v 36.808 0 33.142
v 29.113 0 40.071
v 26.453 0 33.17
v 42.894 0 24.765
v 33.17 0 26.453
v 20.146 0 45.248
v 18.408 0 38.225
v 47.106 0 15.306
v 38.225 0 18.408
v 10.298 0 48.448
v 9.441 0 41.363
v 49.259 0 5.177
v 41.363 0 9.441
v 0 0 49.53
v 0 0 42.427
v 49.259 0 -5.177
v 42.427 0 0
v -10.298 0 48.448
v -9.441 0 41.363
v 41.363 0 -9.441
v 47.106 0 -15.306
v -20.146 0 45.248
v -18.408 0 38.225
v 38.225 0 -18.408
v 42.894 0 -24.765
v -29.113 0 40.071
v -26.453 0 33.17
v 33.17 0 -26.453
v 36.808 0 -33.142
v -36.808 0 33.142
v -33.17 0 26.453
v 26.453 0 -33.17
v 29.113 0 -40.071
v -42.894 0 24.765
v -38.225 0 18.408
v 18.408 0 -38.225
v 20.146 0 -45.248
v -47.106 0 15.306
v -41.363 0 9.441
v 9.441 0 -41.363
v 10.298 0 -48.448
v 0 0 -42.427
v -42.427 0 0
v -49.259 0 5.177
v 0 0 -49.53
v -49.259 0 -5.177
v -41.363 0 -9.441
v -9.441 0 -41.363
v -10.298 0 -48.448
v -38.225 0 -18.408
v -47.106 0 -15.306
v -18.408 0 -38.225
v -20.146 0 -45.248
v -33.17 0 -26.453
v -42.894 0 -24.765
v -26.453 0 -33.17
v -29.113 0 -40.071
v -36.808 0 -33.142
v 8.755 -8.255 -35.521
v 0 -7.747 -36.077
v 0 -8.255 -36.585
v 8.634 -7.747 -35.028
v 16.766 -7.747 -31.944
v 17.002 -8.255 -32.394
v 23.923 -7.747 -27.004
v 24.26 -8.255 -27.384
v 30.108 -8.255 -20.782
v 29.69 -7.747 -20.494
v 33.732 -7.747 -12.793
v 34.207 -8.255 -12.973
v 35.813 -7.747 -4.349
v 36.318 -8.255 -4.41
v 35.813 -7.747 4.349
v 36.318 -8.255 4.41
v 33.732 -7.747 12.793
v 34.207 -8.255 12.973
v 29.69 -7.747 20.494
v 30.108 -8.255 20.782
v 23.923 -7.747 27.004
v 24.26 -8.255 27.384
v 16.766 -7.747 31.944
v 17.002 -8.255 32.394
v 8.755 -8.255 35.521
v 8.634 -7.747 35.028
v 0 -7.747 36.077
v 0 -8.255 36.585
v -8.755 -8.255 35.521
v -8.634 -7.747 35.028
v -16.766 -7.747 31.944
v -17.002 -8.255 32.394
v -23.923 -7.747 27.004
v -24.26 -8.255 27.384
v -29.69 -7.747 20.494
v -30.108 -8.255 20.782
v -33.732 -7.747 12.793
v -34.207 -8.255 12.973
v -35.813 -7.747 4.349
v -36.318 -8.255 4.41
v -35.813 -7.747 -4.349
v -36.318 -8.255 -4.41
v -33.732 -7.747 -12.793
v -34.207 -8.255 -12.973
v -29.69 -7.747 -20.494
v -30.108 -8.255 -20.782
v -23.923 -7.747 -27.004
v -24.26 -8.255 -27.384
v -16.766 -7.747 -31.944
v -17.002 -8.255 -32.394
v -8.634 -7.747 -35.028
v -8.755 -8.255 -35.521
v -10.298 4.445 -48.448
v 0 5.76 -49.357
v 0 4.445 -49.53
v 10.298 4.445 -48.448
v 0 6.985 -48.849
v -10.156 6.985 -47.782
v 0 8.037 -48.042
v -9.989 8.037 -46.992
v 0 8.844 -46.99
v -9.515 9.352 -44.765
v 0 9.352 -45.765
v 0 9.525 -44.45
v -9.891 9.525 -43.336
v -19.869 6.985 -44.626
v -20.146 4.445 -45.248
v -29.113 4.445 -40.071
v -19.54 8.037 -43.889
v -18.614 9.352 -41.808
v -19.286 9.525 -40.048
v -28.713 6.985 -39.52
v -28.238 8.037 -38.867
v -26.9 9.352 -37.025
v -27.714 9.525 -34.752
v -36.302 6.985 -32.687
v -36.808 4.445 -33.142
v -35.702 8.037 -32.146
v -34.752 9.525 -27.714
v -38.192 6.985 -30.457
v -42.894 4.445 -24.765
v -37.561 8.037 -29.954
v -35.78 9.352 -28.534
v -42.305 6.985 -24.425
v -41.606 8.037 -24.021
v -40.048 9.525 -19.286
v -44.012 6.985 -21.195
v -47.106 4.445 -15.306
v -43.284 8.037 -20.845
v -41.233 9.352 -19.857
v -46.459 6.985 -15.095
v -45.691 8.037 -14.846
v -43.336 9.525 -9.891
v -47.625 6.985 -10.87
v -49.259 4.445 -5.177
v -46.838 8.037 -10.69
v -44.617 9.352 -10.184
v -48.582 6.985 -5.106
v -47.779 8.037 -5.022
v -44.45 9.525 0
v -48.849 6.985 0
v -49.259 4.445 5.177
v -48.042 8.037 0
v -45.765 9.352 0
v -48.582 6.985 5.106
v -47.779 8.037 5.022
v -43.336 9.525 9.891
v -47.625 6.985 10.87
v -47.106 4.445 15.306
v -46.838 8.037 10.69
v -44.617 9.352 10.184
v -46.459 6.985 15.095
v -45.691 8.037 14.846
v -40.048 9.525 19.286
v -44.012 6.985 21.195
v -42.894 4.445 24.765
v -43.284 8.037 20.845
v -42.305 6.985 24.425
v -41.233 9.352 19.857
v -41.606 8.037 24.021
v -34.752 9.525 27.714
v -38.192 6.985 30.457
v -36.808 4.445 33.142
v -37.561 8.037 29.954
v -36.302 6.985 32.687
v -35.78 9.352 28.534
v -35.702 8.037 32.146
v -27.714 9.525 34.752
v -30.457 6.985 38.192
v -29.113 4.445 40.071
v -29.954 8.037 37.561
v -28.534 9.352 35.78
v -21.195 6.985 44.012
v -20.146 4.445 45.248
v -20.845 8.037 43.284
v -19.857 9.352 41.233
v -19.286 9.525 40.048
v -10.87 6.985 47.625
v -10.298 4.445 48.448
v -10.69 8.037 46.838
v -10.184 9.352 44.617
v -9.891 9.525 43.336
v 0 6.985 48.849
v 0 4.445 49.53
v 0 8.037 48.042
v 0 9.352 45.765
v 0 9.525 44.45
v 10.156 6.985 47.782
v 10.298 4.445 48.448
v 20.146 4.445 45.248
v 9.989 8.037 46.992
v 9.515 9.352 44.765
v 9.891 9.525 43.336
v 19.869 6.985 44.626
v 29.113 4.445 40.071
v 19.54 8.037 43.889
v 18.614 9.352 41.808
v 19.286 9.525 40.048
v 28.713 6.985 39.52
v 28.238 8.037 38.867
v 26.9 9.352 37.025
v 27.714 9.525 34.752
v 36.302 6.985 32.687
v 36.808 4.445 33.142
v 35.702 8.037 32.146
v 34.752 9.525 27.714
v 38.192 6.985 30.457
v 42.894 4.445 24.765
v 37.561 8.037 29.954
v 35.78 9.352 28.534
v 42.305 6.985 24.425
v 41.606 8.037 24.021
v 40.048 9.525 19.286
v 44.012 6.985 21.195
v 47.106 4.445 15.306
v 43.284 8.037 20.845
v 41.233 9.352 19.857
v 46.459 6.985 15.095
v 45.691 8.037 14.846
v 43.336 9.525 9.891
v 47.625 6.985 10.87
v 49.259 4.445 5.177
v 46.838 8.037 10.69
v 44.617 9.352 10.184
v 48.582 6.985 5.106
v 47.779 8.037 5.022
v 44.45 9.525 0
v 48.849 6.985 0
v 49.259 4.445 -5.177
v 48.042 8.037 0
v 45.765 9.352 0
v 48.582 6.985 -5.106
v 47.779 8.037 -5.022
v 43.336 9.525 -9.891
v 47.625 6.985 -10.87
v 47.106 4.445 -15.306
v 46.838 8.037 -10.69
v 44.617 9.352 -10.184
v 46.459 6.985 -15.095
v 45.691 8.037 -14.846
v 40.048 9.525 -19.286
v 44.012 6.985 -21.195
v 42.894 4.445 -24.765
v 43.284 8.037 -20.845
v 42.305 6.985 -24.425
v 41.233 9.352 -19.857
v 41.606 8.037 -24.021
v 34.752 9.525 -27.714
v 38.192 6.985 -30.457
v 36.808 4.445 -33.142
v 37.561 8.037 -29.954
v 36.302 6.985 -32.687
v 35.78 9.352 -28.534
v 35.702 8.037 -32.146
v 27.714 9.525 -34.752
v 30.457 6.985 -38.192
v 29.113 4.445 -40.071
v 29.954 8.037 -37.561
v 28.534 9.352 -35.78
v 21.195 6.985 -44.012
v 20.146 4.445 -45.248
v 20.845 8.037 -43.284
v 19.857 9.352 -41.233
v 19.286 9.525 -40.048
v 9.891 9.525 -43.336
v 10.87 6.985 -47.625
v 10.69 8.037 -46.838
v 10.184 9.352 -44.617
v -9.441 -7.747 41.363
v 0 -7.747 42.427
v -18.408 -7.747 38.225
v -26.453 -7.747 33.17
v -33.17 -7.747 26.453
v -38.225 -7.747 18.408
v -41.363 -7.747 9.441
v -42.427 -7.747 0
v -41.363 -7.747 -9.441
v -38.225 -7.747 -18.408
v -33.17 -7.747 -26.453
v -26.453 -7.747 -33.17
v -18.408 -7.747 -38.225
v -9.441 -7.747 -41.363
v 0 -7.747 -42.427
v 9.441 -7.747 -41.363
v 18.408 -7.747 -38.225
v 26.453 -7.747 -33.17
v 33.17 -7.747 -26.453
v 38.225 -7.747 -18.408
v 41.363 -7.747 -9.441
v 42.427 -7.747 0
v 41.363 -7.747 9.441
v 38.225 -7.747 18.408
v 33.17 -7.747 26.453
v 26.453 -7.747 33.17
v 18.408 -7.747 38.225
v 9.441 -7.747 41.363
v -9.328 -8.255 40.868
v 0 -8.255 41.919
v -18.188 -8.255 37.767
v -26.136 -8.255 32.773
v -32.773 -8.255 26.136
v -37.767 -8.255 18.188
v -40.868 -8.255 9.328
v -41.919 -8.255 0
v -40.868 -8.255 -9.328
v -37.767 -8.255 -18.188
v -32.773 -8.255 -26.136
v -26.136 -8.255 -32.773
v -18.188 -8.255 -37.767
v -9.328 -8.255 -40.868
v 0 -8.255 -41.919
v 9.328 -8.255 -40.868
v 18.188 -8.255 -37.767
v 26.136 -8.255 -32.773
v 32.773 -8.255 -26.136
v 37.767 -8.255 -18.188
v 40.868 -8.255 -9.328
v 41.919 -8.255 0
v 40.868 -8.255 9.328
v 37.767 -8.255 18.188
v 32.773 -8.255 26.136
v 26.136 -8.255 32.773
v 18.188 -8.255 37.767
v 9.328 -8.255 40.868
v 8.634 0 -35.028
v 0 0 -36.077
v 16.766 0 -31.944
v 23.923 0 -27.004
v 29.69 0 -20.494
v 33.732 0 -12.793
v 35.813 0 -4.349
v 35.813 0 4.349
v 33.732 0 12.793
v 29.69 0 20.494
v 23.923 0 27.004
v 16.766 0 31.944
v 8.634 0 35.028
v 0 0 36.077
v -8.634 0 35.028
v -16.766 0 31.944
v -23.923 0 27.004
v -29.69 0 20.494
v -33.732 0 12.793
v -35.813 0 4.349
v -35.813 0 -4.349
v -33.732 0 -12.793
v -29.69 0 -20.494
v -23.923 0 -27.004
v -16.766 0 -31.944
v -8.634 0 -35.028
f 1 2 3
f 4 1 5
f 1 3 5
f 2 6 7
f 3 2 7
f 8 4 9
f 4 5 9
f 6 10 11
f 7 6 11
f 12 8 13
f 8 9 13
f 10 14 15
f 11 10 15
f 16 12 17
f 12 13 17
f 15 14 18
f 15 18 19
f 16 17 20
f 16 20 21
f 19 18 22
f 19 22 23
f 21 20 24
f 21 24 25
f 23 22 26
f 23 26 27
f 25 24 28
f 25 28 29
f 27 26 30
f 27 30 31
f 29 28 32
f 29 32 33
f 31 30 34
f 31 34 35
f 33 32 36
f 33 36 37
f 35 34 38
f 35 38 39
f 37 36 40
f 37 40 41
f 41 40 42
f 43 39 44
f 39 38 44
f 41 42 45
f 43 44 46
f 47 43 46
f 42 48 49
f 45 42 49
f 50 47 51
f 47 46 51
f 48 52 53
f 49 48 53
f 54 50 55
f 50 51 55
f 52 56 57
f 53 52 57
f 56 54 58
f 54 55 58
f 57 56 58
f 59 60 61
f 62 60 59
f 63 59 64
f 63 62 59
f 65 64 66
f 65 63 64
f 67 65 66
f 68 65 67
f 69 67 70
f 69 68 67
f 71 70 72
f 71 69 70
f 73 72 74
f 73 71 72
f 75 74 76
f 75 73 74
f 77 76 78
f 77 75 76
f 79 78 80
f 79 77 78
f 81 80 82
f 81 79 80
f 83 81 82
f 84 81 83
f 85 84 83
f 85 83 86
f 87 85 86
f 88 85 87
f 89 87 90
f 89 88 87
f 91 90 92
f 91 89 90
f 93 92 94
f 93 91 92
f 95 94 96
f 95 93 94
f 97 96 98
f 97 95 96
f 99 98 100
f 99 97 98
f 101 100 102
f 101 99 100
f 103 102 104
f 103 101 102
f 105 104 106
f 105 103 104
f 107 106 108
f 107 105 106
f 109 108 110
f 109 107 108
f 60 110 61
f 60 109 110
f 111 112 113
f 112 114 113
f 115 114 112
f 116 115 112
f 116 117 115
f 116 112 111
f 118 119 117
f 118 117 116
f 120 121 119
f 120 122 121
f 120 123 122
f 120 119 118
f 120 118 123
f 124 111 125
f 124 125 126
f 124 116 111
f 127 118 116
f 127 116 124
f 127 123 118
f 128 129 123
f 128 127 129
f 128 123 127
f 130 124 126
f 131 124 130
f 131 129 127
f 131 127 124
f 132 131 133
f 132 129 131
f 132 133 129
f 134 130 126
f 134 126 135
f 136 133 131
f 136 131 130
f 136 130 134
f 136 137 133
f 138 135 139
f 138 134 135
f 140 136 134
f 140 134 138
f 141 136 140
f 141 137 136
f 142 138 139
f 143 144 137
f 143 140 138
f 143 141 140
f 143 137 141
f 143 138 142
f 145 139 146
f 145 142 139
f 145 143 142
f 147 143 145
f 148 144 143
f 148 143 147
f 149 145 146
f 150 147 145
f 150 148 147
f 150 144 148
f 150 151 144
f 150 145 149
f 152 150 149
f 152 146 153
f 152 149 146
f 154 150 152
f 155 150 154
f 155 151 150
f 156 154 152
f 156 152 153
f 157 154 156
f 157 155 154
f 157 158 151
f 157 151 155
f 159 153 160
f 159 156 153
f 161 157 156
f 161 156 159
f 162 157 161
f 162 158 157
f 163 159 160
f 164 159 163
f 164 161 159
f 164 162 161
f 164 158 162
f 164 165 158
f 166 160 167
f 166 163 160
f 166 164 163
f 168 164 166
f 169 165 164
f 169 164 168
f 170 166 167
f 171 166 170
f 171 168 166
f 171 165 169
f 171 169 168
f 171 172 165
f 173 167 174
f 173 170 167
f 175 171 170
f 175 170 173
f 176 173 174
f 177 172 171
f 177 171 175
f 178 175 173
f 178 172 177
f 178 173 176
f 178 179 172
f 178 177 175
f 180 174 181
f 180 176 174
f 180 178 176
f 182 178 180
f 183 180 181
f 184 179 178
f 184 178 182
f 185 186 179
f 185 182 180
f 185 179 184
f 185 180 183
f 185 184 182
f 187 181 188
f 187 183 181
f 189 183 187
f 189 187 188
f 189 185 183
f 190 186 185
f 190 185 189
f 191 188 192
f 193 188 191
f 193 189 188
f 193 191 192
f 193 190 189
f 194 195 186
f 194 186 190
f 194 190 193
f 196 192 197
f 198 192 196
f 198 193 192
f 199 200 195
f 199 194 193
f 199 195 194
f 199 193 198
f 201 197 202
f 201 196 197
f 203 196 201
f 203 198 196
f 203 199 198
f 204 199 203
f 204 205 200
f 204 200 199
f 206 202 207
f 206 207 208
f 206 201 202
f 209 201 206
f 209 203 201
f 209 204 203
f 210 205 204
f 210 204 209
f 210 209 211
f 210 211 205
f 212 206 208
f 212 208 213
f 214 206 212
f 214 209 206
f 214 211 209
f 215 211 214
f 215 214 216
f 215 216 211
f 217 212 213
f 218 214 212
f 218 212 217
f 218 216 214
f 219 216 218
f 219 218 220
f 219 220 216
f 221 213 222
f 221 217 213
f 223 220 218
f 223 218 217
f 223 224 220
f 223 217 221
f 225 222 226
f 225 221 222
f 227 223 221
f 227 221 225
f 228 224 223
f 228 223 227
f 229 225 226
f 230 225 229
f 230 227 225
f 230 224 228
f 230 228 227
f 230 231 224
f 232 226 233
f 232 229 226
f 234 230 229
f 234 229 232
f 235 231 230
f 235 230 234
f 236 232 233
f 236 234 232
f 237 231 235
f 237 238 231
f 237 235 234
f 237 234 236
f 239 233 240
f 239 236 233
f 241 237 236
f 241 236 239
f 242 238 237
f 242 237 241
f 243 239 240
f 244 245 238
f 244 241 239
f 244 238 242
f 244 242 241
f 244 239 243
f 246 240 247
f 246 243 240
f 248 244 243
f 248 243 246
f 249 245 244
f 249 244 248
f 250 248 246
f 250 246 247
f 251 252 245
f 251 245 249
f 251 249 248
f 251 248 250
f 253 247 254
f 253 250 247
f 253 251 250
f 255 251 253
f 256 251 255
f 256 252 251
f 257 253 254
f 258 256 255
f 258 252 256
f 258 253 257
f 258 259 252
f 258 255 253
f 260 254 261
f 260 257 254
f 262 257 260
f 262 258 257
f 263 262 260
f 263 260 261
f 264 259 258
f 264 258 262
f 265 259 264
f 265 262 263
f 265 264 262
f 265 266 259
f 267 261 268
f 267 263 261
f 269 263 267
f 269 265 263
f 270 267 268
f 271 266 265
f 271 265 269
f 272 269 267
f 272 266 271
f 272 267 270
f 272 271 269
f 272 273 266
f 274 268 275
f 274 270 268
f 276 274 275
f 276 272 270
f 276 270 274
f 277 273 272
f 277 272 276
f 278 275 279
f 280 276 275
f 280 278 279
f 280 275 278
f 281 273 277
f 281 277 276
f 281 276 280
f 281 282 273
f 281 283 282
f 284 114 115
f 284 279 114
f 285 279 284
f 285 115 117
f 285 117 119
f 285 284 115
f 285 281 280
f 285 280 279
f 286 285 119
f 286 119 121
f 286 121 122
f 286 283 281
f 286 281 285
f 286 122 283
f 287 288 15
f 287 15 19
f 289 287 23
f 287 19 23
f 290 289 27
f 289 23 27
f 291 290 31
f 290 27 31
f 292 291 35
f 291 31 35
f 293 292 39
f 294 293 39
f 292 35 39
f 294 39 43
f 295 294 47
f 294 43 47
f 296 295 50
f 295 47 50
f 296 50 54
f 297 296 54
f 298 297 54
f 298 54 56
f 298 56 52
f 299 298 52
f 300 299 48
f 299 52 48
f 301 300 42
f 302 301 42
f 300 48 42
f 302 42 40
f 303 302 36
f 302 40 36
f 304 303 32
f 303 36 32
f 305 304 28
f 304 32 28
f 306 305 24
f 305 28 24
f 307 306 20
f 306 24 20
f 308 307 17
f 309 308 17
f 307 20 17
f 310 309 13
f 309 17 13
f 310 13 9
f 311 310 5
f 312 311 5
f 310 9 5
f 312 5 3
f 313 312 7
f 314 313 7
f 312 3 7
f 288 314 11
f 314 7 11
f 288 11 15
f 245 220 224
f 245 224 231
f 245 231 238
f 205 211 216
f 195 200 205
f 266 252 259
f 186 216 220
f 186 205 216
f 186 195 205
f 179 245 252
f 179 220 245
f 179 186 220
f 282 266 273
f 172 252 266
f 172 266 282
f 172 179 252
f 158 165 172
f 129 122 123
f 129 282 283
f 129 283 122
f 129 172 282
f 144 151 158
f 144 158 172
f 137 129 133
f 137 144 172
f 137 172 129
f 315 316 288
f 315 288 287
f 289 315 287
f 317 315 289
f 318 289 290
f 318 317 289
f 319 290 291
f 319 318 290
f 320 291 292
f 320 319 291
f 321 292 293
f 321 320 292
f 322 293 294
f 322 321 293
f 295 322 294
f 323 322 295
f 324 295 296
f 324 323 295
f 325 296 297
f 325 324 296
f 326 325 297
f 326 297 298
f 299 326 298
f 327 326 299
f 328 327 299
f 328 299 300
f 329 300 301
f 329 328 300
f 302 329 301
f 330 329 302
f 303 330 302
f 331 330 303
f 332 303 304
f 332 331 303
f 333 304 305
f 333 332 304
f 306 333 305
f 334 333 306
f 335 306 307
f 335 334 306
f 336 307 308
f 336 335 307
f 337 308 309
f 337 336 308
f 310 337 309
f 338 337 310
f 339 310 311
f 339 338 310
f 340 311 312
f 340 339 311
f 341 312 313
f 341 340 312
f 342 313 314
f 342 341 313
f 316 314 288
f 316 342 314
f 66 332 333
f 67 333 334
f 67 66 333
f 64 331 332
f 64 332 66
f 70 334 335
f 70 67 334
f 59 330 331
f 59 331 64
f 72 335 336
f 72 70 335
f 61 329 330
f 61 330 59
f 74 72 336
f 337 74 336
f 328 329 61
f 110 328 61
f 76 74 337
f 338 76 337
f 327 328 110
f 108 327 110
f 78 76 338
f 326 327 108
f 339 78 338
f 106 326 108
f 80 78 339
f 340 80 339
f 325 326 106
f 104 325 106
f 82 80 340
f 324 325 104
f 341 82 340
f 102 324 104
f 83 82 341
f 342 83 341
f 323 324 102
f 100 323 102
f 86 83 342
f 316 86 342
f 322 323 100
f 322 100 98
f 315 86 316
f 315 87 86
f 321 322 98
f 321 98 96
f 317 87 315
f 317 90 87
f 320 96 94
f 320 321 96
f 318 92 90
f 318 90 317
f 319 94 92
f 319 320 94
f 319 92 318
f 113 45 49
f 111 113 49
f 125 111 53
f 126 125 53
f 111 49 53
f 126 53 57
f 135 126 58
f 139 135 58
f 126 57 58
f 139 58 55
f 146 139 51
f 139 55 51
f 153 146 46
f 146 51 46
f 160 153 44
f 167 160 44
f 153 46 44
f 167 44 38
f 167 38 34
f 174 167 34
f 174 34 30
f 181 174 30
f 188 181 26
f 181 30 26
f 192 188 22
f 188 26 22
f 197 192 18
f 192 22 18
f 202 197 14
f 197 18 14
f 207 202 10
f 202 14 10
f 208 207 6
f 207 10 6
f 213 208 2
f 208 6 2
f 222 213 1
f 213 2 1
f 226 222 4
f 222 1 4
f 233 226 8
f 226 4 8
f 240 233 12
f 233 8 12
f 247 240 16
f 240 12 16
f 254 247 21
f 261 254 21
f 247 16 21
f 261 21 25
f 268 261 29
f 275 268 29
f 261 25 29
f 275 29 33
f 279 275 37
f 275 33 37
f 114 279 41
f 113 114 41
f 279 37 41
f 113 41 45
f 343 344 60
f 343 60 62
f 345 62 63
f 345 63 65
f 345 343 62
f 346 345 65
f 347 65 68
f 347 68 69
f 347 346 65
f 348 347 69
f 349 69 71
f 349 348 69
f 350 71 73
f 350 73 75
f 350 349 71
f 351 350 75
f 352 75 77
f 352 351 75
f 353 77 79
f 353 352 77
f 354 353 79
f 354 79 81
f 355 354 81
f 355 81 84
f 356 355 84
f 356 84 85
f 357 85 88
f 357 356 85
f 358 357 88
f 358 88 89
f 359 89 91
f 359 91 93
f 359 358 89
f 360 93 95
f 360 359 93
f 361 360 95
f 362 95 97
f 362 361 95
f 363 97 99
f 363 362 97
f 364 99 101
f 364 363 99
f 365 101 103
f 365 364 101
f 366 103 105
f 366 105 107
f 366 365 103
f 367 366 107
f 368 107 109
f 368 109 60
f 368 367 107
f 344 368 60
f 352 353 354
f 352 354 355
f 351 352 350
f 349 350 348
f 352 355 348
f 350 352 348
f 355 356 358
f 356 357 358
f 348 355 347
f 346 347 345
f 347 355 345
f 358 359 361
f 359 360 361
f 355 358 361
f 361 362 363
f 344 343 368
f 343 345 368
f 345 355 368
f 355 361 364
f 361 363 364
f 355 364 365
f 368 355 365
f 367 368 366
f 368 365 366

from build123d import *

# Parameters (mm, degrees)
SKETCH1_R     = 49.53
BODY_DEPTH    = 9.525
SKETCH2_R     = 42.426526601
SKETCH2_R_2   = 36.076526601
FLANGE_DEPTH  = 8.255
FILLET1_R     = 5.08
CHAMFER1_SIZE = 0.508


with BuildPart() as part:
    # Sketch1 → body (new body)
    with BuildSketch(Plane(origin=(0, 0, 0), x_dir=(1, 0, 0), z_dir=(0, 1, 0))):
        with Locations(Location((0, 0, 0), (0, 0, 90))):
            Circle(SKETCH1_R)
    extrude(amount=BODY_DEPTH)

    # Sketch2 → flange (add)
    with BuildSketch(Plane.XZ):
        with Locations(Location((0, 0, 0), (0, 0, 90))):
            Circle(SKETCH2_R)
        with Locations(Location((0, 0, 0), (0, 0, 270))):
            Circle(SKETCH2_R_2, mode=Mode.SUBTRACT)
    extrude(amount=FLANGE_DEPTH)

    # Fillet1
    fillet1_edges = [part.edges().sort_by_distance(p)[0] for p in [
        (0, 9.525, 49.53),
    ]]
    fillet(fillet1_edges, radius=FILLET1_R)

    # Chamfer1
    chamfer1_edges = [part.edges().sort_by_distance(p)[0] for p in [
        (0, -8.255, -42.426526601),
        (0, -8.255, 36.076526601),
    ]]
    chamfer(chamfer1_edges, length=CHAMFER1_SIZE)


solid = part.part
